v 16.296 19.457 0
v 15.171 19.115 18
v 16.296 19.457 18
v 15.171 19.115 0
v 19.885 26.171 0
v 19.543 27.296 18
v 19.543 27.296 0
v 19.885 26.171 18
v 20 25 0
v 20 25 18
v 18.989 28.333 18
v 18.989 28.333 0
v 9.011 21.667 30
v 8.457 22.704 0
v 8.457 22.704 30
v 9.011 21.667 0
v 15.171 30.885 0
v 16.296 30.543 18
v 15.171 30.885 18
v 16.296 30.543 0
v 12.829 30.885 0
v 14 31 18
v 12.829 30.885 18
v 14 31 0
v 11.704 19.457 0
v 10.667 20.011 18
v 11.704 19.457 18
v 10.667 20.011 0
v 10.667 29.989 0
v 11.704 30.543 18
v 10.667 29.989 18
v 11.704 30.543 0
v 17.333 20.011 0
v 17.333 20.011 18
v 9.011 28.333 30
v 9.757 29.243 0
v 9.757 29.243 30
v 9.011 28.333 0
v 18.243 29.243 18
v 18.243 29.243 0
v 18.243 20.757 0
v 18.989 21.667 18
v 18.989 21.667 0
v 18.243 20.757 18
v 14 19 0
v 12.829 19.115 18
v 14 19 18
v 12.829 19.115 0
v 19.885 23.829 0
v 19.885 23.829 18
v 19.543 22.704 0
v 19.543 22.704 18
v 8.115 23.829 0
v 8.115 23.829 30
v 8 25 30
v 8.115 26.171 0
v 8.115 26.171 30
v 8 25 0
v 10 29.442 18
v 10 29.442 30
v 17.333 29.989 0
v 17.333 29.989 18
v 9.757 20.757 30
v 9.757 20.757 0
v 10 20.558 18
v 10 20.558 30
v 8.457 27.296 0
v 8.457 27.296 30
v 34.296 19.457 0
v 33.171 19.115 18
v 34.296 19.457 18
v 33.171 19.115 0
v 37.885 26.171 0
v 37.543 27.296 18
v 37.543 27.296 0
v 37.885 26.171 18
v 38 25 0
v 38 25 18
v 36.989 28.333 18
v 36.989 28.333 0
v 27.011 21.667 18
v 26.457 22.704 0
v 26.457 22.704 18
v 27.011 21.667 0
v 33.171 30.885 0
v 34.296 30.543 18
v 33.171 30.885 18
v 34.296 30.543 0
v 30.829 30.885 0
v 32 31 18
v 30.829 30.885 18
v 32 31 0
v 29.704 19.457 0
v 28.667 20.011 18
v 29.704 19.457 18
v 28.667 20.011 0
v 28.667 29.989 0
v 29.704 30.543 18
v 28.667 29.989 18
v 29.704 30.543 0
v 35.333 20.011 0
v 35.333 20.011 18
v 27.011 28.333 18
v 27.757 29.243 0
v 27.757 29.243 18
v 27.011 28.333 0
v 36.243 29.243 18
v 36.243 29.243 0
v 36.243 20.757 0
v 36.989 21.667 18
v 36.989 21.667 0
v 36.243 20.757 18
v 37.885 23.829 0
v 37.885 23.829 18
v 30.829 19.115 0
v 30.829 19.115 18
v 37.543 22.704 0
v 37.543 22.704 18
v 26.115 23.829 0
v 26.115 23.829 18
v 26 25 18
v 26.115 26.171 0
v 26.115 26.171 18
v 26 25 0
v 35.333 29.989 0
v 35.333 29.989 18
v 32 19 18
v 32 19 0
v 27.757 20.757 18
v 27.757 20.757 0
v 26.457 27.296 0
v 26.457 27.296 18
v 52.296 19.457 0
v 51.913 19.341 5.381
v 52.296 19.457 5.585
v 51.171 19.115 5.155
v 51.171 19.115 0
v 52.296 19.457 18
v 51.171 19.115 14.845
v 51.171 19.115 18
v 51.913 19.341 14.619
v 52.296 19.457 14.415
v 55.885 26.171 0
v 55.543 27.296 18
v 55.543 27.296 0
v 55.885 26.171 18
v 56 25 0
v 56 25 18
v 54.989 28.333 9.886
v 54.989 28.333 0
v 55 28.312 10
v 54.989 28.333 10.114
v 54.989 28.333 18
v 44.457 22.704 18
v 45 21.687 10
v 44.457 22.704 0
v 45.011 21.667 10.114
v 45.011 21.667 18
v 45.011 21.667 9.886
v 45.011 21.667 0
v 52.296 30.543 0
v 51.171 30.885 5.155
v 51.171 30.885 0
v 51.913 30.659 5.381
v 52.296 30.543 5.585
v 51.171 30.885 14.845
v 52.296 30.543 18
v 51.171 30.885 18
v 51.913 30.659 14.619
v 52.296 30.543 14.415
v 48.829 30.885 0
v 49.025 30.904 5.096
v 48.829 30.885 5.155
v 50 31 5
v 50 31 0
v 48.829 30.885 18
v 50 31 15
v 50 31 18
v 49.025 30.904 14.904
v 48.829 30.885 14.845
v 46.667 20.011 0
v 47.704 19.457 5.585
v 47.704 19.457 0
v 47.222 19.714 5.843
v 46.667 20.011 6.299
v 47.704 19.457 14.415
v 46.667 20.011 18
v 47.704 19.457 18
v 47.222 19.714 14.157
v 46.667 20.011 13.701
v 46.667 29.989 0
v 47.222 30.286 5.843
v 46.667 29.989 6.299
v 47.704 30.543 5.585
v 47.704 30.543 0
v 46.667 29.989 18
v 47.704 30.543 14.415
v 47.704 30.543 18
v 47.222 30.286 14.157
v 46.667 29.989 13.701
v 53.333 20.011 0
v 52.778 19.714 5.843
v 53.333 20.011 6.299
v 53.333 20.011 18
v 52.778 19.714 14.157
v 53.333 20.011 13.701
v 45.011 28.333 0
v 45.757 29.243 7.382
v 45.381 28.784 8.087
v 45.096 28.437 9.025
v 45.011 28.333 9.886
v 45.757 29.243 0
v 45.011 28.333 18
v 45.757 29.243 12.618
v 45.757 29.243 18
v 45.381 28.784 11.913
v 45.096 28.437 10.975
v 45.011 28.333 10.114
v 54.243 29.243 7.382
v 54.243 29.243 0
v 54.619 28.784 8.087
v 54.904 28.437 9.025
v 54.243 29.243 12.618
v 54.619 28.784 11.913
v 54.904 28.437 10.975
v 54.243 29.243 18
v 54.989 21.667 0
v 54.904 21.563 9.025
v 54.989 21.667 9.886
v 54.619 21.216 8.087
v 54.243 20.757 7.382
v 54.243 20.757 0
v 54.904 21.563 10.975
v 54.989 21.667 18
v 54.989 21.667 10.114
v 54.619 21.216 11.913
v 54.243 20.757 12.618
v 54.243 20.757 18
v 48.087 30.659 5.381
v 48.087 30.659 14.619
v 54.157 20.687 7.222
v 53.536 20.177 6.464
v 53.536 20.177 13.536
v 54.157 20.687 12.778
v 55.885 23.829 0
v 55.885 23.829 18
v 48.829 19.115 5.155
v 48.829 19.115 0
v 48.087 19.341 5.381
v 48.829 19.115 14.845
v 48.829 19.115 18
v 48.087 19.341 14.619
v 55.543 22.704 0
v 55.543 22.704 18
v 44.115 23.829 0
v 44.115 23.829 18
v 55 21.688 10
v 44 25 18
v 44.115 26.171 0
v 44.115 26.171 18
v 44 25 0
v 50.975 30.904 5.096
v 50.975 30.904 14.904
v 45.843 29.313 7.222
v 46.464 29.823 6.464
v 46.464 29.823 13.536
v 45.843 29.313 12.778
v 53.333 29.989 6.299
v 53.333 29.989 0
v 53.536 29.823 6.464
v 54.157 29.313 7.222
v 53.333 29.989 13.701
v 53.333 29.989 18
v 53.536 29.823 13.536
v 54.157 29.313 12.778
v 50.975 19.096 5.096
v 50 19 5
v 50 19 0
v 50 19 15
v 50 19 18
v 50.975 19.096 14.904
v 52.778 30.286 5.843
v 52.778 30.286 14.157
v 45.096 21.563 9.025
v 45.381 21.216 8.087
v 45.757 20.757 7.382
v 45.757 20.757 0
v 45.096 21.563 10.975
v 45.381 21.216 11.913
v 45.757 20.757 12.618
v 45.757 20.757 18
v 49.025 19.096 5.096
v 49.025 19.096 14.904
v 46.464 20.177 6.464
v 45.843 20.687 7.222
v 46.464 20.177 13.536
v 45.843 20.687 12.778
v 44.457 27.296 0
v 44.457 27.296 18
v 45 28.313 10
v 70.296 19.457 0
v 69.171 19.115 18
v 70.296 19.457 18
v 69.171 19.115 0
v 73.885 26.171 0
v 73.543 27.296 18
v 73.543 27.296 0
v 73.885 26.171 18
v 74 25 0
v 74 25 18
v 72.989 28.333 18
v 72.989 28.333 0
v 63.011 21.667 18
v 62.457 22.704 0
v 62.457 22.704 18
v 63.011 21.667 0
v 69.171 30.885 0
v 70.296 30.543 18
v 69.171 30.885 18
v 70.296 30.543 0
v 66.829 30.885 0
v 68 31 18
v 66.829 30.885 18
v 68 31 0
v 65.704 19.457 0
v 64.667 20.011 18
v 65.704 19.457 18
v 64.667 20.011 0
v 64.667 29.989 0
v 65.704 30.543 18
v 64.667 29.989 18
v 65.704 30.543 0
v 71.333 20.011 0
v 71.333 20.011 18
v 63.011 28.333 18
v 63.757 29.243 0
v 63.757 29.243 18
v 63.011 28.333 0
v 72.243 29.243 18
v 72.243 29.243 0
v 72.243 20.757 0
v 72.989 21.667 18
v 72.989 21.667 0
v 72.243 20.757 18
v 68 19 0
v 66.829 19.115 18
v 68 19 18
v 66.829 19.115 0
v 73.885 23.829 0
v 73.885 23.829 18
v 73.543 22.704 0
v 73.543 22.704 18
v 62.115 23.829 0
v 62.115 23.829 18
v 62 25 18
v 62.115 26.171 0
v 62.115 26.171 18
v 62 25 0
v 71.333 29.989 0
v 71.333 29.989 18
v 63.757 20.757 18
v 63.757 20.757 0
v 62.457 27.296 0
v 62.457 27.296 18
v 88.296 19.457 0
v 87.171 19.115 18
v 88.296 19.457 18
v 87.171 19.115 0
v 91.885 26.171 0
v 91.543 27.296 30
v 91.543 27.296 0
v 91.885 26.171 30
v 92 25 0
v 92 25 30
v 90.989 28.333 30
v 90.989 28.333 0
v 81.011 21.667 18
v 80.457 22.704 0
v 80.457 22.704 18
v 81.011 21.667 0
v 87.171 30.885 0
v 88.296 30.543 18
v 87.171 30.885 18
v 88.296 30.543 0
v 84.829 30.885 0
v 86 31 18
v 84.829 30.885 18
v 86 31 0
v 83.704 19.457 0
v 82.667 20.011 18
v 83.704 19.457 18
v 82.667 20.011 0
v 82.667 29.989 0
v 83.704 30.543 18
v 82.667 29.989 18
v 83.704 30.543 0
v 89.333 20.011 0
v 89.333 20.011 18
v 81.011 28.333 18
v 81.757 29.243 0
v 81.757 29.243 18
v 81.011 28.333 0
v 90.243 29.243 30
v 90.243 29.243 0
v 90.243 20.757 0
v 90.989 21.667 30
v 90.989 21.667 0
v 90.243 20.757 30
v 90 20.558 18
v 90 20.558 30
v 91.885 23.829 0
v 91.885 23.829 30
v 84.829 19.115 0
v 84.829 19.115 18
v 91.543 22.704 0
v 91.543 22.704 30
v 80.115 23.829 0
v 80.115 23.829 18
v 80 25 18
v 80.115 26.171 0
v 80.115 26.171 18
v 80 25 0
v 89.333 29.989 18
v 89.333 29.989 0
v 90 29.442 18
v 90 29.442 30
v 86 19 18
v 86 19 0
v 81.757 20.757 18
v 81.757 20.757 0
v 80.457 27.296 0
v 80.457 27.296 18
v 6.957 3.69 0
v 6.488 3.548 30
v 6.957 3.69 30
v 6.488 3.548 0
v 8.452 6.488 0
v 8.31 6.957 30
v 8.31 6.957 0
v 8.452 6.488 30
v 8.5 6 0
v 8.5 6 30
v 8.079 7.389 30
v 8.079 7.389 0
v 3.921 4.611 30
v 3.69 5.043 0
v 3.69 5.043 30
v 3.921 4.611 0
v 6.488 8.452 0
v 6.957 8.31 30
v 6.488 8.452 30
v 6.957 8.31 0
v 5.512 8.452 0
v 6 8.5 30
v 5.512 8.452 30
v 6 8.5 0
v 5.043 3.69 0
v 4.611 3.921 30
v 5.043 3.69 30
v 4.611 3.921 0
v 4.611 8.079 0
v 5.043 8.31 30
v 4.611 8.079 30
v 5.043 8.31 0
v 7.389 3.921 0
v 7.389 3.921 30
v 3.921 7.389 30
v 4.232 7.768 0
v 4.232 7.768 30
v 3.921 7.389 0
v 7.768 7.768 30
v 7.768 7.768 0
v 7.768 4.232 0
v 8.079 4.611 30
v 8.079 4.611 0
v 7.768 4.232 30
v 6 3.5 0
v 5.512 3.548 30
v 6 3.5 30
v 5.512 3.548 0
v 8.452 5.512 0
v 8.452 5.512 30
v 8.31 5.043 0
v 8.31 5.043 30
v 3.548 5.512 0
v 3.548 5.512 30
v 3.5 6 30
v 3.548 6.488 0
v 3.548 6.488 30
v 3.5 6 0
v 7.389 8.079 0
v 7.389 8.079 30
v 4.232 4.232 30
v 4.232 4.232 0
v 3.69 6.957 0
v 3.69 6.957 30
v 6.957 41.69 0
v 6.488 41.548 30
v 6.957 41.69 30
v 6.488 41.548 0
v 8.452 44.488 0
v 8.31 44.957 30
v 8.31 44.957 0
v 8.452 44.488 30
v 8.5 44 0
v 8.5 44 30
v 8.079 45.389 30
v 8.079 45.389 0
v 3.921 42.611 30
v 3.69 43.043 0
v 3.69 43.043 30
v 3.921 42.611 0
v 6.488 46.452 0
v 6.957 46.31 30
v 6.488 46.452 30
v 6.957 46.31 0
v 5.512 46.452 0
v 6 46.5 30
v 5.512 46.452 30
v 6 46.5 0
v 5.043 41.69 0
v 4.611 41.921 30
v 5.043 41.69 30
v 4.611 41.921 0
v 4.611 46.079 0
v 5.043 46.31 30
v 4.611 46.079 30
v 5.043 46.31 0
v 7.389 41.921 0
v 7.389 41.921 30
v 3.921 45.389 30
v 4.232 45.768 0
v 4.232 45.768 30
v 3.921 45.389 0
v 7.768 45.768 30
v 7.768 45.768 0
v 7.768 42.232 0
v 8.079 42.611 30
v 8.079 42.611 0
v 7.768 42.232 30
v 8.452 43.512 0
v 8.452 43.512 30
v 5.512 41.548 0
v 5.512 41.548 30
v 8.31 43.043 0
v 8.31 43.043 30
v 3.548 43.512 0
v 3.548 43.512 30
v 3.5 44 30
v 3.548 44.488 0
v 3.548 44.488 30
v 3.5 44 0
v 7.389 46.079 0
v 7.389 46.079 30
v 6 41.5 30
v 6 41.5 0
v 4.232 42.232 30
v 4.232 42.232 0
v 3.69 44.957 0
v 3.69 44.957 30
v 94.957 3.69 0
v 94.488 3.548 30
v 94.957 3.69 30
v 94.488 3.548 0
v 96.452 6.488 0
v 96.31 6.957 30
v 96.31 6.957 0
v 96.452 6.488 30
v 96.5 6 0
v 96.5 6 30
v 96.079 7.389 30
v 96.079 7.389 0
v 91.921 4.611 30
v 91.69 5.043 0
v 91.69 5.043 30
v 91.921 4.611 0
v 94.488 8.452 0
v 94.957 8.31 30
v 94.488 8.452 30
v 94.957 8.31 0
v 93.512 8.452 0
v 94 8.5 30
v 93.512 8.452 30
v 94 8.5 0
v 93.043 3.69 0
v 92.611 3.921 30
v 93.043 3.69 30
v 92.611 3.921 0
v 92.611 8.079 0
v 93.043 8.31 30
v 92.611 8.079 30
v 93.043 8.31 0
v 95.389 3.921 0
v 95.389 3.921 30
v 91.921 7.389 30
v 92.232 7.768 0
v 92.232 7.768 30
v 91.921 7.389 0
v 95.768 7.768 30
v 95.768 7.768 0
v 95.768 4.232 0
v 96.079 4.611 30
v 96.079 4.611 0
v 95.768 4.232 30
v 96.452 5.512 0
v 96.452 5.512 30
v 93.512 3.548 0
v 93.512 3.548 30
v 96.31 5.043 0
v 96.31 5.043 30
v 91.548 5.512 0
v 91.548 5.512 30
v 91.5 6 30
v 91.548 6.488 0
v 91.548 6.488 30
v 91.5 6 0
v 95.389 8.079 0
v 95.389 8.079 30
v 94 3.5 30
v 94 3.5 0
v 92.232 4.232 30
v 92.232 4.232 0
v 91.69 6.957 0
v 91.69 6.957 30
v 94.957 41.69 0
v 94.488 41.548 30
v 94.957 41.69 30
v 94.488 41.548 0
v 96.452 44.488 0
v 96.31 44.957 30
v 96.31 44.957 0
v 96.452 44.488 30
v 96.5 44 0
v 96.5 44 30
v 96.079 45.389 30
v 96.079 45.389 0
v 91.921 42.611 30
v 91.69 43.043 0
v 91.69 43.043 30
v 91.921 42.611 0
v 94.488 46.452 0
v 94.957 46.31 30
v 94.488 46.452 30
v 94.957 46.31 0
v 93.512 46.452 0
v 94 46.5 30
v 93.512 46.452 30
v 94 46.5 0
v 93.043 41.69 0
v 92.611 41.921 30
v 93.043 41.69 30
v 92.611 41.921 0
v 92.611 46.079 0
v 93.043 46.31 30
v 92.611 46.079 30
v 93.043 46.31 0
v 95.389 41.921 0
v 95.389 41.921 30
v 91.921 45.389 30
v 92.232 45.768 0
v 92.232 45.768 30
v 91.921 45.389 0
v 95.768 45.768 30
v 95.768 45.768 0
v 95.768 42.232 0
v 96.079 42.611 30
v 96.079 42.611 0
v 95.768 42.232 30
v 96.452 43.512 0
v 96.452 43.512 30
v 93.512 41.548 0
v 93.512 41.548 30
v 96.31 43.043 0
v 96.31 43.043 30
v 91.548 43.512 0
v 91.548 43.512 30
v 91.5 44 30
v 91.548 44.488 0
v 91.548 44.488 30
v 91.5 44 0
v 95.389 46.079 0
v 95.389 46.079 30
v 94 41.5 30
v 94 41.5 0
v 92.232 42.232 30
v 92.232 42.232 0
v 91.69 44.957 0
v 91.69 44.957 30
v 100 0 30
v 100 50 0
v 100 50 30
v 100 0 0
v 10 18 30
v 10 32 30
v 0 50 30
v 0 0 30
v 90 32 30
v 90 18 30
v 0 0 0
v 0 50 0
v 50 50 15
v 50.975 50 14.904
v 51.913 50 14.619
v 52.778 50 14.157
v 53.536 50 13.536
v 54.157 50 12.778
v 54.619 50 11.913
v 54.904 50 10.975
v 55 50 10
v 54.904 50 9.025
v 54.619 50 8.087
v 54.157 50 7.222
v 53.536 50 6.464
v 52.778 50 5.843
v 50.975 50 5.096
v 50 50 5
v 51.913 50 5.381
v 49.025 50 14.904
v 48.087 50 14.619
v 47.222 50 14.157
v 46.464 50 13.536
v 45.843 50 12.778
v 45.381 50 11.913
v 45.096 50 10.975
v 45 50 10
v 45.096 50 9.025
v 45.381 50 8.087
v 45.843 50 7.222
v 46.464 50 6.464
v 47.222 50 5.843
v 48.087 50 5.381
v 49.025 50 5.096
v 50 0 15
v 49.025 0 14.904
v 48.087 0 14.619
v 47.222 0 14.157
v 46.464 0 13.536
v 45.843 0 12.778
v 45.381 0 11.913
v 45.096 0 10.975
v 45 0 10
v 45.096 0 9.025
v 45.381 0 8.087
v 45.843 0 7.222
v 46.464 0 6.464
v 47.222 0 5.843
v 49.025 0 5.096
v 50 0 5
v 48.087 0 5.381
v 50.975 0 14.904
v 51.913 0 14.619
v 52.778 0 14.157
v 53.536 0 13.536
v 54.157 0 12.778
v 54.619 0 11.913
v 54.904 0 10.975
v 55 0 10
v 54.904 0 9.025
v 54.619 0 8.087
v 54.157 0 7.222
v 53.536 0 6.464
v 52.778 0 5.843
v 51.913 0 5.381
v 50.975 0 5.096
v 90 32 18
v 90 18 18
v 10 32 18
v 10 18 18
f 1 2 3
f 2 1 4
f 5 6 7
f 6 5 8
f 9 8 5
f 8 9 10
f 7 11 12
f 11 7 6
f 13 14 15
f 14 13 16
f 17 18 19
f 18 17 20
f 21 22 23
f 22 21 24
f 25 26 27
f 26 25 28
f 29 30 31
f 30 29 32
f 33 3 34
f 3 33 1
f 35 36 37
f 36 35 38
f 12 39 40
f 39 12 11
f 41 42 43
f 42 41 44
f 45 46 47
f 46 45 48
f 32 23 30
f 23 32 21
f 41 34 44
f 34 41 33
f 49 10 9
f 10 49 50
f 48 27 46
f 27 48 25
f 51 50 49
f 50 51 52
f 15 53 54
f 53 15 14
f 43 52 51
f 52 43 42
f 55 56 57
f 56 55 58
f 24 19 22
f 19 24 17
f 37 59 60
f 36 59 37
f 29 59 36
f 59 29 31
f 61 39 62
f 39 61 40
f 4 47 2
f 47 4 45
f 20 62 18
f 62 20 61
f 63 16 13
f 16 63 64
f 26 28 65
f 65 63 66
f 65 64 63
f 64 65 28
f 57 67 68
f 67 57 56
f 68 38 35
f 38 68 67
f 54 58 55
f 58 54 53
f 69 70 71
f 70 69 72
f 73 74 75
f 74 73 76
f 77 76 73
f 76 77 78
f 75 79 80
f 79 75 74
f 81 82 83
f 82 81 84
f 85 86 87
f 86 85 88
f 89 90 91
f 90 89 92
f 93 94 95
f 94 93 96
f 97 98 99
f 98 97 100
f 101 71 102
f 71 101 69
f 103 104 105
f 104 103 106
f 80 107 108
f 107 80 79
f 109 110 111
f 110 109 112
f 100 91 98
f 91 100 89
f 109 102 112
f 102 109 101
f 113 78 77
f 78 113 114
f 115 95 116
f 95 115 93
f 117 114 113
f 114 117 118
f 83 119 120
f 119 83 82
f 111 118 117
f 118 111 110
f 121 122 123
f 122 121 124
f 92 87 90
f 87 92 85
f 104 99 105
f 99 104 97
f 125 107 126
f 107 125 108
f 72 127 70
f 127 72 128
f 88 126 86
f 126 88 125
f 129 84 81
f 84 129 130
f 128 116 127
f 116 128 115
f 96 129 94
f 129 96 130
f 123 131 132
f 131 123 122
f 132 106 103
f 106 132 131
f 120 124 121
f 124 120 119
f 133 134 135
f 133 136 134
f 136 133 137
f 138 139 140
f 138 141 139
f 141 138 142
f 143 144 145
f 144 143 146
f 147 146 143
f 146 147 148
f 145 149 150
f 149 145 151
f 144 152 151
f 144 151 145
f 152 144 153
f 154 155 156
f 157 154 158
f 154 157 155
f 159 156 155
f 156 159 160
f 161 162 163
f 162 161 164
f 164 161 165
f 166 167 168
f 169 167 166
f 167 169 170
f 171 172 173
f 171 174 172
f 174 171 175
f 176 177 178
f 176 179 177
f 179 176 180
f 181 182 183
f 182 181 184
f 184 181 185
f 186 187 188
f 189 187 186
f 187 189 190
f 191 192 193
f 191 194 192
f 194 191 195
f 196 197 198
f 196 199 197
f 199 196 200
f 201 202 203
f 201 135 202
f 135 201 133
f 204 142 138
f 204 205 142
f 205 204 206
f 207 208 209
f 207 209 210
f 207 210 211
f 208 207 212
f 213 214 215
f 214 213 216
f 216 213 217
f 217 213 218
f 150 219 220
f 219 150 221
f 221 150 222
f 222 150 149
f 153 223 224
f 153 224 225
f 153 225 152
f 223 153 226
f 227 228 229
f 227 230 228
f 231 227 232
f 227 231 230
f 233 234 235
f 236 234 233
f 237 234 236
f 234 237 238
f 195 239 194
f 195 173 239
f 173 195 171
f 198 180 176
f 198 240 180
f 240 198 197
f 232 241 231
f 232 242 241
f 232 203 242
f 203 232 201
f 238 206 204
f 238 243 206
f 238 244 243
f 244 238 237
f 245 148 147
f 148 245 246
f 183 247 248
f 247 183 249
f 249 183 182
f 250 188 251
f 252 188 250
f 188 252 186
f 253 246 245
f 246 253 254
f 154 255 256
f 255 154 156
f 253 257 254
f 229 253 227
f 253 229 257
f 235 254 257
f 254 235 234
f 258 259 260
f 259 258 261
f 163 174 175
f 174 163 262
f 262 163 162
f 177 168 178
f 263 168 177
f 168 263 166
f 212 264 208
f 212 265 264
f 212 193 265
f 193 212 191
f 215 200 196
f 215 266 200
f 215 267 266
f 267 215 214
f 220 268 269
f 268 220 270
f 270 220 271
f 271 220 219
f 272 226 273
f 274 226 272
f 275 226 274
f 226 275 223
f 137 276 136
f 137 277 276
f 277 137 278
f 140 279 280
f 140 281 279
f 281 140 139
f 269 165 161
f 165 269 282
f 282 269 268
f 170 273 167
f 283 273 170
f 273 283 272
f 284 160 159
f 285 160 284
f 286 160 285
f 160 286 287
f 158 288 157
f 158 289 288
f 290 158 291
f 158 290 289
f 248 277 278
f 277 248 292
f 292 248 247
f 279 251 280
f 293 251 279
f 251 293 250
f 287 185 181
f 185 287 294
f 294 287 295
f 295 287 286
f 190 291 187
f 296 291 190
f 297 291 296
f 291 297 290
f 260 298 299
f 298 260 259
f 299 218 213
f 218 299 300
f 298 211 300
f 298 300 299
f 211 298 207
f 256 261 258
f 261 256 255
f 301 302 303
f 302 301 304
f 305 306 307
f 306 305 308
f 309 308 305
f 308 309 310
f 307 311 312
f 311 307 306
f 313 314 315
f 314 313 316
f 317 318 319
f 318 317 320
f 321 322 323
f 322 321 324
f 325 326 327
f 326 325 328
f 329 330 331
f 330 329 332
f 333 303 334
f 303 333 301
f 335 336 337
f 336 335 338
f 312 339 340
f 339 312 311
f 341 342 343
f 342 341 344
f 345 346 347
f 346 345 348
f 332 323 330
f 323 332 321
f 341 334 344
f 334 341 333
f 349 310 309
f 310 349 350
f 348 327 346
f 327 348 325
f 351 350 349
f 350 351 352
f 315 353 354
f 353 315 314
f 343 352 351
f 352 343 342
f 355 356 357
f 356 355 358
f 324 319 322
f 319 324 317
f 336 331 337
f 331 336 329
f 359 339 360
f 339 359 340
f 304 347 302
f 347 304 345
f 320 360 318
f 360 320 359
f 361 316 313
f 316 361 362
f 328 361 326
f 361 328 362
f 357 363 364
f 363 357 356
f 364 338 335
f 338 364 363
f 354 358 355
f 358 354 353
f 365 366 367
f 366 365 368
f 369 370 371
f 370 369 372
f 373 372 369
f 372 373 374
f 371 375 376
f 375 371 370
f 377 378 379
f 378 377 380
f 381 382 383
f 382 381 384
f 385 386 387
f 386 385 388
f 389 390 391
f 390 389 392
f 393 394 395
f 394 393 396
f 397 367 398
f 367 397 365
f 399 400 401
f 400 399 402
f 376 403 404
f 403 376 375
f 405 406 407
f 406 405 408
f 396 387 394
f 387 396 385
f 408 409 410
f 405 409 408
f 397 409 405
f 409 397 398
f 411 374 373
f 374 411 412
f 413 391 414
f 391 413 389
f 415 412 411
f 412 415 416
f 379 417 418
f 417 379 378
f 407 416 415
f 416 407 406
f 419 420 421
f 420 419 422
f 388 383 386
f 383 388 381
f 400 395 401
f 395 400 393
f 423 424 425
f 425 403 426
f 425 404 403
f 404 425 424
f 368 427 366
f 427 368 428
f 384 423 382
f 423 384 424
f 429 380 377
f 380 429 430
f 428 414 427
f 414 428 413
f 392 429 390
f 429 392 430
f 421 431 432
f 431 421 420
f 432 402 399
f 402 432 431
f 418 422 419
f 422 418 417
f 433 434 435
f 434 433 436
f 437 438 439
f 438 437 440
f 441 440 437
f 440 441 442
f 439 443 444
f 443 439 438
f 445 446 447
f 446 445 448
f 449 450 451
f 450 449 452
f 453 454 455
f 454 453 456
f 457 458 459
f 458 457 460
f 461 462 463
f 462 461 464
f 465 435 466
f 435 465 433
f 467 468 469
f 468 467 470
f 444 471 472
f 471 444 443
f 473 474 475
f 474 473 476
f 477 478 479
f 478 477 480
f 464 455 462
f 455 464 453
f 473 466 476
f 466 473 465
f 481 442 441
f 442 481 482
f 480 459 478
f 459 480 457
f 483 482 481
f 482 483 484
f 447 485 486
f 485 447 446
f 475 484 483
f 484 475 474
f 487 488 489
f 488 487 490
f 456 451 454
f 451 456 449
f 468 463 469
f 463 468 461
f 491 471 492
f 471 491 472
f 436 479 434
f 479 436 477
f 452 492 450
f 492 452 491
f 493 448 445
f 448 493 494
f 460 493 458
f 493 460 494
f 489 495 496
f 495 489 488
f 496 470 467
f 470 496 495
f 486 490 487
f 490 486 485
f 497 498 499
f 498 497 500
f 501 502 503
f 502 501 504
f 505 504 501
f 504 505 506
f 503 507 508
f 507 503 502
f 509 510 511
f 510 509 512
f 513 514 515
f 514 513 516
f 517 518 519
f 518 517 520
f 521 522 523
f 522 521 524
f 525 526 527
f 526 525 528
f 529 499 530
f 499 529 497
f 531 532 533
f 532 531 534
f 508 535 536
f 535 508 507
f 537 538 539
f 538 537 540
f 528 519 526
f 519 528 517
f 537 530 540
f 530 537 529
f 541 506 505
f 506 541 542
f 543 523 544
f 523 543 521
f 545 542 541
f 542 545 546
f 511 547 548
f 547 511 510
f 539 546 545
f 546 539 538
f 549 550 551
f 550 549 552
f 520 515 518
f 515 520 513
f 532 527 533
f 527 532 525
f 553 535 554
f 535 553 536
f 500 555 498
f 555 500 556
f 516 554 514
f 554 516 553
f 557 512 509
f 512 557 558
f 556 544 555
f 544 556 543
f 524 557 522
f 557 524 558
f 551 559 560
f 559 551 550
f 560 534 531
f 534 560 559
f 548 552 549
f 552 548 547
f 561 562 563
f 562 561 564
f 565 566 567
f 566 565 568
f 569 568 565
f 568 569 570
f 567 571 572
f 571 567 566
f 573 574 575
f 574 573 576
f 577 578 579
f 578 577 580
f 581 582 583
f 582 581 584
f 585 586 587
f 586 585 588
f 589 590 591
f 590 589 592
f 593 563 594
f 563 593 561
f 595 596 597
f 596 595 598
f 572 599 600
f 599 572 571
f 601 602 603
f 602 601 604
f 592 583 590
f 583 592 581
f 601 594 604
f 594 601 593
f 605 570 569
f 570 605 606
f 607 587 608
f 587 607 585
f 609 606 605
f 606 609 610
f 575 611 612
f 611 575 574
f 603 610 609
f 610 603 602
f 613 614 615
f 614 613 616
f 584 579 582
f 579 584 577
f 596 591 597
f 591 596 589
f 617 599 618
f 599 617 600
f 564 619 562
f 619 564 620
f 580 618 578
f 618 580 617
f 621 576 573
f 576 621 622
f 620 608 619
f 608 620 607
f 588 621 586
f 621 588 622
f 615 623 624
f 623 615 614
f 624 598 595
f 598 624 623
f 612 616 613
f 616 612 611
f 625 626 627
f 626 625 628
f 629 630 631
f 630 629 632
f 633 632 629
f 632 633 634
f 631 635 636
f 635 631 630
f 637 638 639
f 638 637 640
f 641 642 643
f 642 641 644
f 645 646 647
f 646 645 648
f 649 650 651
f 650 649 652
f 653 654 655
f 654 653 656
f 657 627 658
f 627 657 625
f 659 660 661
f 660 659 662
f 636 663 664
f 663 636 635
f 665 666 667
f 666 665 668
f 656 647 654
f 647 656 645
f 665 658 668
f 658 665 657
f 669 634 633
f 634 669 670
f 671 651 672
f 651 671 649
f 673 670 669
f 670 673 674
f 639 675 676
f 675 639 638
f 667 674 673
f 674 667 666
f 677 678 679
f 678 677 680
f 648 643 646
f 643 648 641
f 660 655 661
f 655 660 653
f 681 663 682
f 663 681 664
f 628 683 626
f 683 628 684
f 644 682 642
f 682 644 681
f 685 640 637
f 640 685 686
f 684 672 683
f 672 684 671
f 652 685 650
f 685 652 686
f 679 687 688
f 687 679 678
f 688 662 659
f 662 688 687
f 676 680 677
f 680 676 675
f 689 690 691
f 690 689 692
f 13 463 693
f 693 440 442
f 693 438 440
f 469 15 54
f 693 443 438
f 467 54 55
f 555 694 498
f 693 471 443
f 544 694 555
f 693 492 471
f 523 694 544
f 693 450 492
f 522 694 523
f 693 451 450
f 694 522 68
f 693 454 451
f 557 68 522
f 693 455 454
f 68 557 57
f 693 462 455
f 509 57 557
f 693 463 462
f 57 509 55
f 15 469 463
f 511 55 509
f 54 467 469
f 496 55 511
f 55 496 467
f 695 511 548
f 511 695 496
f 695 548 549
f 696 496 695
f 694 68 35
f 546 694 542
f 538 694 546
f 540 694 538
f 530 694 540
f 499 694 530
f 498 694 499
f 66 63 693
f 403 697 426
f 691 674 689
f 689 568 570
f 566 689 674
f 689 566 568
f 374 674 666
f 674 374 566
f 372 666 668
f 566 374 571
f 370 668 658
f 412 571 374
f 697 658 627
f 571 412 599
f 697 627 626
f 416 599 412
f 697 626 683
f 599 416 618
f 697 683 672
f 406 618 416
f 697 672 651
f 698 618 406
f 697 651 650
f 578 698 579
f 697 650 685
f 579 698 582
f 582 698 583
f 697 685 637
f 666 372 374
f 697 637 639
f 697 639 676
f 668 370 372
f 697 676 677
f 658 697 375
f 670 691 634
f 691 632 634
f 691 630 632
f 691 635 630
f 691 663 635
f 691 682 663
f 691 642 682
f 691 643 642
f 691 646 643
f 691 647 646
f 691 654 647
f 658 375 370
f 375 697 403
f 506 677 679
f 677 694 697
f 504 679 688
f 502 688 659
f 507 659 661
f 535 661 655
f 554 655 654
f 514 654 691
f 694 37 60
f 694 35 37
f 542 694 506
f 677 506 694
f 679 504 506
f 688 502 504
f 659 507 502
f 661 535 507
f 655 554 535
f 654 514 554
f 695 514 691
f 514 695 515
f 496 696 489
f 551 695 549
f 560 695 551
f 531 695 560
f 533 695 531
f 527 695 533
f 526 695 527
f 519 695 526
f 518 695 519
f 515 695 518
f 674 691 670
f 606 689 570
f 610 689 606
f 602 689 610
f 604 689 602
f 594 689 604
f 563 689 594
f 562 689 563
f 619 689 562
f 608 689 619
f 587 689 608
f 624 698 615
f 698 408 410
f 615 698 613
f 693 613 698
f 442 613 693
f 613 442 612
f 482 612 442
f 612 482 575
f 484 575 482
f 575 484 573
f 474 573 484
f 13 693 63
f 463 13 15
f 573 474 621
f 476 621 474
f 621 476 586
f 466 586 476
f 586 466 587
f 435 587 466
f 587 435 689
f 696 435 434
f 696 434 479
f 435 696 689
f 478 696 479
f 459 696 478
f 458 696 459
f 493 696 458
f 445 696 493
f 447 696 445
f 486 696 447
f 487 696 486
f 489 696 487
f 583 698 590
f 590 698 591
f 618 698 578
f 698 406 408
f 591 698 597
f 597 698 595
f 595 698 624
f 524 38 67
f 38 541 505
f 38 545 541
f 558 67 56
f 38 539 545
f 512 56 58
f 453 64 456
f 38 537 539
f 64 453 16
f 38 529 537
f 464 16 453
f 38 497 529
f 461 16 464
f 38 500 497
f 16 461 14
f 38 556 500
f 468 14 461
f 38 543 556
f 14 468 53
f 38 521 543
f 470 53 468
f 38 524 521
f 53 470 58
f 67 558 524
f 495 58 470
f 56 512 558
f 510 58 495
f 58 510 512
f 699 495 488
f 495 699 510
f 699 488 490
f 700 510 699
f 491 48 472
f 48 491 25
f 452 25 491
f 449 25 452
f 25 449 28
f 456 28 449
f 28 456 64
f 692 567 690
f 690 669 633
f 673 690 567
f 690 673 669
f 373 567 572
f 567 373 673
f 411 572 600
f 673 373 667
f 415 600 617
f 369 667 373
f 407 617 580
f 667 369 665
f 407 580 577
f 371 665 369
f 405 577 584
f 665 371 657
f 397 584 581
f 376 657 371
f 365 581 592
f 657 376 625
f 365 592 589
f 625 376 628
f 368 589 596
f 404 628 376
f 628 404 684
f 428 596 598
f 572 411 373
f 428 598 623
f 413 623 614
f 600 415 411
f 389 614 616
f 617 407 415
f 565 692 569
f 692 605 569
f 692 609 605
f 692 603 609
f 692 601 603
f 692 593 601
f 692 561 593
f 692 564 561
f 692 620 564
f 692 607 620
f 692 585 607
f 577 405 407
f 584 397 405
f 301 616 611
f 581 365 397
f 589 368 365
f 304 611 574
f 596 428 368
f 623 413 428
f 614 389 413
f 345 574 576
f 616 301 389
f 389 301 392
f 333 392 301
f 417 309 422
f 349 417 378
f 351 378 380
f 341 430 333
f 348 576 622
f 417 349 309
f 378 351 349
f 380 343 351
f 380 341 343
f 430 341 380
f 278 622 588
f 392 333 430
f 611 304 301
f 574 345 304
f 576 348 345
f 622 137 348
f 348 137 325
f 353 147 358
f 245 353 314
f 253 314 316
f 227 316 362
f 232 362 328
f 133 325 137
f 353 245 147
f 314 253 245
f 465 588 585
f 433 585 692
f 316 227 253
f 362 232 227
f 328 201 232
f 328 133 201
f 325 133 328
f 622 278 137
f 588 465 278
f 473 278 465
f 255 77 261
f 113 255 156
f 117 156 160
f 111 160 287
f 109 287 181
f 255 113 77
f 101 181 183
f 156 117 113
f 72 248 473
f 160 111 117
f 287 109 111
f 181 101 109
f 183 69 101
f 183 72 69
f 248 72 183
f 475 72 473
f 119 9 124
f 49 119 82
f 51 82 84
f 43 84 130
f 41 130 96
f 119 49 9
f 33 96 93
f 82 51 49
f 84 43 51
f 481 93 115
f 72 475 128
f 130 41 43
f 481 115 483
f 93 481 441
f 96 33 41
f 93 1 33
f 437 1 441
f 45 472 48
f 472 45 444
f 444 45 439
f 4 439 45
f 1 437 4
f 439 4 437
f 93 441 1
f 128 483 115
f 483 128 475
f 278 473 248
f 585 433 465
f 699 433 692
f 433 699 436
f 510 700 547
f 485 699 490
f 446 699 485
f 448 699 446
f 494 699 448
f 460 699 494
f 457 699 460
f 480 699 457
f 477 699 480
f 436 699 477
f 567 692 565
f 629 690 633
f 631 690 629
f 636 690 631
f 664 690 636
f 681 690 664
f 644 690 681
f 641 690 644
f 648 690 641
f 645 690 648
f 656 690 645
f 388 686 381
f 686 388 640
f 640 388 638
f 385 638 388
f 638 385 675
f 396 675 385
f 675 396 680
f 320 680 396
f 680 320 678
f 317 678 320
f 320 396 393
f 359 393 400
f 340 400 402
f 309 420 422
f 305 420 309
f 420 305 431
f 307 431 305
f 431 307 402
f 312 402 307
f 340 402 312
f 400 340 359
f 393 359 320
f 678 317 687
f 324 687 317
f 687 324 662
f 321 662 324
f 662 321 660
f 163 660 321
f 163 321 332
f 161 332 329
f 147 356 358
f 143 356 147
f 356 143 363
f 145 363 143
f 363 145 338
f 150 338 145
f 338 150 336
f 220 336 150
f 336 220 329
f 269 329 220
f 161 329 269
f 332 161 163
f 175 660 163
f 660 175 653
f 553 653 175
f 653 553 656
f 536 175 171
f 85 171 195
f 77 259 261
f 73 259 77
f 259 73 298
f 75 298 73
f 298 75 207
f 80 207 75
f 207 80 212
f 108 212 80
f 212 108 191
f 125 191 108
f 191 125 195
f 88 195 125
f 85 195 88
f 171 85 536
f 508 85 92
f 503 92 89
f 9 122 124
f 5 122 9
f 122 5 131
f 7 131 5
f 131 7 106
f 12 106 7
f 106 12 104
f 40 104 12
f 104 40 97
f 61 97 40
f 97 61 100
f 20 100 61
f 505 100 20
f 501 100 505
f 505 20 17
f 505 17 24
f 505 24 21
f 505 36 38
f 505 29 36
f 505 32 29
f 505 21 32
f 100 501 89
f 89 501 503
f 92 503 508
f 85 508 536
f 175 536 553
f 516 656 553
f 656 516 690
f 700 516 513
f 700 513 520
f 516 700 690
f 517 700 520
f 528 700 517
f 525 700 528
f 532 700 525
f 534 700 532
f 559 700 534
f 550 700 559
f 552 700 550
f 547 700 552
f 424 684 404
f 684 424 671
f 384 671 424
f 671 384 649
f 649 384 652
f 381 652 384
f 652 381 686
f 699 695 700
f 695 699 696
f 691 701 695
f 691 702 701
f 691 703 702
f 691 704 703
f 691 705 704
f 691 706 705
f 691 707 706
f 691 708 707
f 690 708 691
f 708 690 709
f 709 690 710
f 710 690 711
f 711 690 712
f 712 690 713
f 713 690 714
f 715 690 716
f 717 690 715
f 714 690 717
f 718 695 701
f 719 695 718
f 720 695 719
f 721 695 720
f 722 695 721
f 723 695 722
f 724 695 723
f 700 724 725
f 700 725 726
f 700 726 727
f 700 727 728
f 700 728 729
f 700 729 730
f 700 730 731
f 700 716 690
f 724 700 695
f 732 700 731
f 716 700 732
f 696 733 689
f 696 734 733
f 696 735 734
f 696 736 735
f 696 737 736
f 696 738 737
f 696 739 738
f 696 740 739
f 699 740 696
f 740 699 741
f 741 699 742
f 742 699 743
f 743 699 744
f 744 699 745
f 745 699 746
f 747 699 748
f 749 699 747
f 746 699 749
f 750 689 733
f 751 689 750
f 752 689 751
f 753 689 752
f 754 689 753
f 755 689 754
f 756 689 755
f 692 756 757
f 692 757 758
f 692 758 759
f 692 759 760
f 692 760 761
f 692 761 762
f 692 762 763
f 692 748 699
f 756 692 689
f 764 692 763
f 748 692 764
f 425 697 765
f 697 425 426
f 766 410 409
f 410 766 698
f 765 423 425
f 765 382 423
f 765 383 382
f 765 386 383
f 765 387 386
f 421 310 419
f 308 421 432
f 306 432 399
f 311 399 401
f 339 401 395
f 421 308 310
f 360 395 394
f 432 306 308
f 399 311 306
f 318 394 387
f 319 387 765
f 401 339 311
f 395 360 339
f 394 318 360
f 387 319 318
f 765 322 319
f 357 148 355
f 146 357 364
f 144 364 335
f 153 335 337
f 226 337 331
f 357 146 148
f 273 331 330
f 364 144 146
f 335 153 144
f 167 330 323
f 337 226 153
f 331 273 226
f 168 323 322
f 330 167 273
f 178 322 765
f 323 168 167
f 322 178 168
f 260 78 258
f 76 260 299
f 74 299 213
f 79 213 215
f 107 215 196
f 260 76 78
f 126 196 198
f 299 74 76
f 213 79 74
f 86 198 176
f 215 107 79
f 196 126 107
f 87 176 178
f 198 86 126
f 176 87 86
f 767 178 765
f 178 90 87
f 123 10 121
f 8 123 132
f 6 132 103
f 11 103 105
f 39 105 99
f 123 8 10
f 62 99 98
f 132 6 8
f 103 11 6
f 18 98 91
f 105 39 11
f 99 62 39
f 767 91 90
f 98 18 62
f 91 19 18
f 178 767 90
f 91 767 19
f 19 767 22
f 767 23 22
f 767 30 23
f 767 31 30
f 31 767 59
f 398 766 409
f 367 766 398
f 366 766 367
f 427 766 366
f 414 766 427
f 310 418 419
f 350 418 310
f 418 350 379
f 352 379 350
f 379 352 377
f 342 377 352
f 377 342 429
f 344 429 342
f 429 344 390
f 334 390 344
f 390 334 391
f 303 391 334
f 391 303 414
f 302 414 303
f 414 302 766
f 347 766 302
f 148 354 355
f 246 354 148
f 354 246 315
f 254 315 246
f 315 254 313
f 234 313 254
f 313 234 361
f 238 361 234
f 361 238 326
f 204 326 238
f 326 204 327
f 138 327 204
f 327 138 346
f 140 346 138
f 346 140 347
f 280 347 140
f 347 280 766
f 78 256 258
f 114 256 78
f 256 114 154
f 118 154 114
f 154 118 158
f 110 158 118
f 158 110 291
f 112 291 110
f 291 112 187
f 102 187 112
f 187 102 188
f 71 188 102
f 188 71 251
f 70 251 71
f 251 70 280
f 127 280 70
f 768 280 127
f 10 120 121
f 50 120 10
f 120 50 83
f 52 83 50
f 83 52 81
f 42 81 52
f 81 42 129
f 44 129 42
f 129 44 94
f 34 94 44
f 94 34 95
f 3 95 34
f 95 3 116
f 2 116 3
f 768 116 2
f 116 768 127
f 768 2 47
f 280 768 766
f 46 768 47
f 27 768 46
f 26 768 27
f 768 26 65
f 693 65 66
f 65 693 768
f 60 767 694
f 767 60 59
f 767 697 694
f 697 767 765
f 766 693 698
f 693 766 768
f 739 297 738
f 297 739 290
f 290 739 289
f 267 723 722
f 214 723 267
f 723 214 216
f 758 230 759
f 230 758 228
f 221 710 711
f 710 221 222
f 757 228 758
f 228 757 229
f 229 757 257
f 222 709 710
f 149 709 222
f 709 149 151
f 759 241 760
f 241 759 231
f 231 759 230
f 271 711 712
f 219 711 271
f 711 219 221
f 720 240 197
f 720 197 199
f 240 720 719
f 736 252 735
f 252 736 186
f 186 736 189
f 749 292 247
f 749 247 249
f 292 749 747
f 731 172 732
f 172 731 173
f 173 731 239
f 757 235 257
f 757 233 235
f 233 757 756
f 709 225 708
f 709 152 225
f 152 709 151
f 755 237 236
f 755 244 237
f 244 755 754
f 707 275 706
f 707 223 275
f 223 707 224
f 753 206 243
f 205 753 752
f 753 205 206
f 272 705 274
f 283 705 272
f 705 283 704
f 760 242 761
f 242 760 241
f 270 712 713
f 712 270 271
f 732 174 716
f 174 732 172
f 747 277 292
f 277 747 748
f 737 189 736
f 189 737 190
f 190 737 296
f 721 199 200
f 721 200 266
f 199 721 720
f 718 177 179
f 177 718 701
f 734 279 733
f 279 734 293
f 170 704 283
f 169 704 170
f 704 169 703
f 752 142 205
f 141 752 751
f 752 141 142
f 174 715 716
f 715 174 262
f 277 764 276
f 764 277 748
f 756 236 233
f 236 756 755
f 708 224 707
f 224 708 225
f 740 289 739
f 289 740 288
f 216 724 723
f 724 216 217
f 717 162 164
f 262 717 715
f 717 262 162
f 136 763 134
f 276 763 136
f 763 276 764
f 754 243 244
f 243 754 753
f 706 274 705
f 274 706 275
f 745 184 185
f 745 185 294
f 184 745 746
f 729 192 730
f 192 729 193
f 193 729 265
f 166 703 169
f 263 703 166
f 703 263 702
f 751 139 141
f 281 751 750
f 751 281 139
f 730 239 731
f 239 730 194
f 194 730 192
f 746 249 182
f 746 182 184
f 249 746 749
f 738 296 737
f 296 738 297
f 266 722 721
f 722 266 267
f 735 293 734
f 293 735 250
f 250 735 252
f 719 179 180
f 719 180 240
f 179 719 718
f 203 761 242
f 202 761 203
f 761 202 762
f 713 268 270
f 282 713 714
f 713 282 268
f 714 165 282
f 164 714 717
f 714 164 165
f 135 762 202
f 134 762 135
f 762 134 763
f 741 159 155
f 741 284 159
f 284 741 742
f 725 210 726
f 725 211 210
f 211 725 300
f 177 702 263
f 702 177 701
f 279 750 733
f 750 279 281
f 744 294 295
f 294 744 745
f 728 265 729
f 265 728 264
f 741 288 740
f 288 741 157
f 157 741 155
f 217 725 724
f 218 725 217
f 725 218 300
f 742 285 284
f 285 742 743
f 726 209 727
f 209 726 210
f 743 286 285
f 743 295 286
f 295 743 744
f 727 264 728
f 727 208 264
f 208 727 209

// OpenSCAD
$fn = 32;

// ----------------------------------------------------------------------
// Manifold block: side_outlet manifold
// ----------------------------------------------------------------------

// --- parameters (mm) ---
block_l = 100;            // block length, X
block_w = 50;             // block width, Y
block_h = 30;             // block height, Z
port_d = 12;              // port bore diameter
port_pitch = 18;          // port pitch along X
gallery_d = 14;           // top gallery width, Y
gallery_depth = 12;       // gallery pocket depth
wall_p = 10;              // gallery end wall thickness, X
mnt_d = 5;                // mounting hole diameter
mnt_in = 6;               // mounting hole inset from the edges
out_d = 10;               // outlet bore diameter
out_z = 10;               // outlet axis height

n_ports = 5;  // ports in the row
port_x0 = (block_l - (n_ports - 1) * port_pitch) / 2;  // first port X

difference() {
  cube([block_l, block_w, block_h]);
  for (i = [0 : n_ports - 1])
    translate([port_x0 + i * port_pitch, block_w / 2, -1])
      cylinder(h = block_h + 2, d = port_d);
  translate([wall_p, block_w / 2 - gallery_d / 2, block_h - gallery_depth])
    cube([block_l - 2 * wall_p, gallery_d, gallery_depth + 1]);
  for (cx = [mnt_in, block_l - mnt_in])
    for (cy = [mnt_in, block_w - mnt_in])
      translate([cx, cy, -1]) cylinder(h = block_h + 2, d = mnt_d);
  translate([block_l / 2, -1, out_z]) rotate([-90, 0, 0])
    cylinder(h = block_w + 2, d = out_d);
}
